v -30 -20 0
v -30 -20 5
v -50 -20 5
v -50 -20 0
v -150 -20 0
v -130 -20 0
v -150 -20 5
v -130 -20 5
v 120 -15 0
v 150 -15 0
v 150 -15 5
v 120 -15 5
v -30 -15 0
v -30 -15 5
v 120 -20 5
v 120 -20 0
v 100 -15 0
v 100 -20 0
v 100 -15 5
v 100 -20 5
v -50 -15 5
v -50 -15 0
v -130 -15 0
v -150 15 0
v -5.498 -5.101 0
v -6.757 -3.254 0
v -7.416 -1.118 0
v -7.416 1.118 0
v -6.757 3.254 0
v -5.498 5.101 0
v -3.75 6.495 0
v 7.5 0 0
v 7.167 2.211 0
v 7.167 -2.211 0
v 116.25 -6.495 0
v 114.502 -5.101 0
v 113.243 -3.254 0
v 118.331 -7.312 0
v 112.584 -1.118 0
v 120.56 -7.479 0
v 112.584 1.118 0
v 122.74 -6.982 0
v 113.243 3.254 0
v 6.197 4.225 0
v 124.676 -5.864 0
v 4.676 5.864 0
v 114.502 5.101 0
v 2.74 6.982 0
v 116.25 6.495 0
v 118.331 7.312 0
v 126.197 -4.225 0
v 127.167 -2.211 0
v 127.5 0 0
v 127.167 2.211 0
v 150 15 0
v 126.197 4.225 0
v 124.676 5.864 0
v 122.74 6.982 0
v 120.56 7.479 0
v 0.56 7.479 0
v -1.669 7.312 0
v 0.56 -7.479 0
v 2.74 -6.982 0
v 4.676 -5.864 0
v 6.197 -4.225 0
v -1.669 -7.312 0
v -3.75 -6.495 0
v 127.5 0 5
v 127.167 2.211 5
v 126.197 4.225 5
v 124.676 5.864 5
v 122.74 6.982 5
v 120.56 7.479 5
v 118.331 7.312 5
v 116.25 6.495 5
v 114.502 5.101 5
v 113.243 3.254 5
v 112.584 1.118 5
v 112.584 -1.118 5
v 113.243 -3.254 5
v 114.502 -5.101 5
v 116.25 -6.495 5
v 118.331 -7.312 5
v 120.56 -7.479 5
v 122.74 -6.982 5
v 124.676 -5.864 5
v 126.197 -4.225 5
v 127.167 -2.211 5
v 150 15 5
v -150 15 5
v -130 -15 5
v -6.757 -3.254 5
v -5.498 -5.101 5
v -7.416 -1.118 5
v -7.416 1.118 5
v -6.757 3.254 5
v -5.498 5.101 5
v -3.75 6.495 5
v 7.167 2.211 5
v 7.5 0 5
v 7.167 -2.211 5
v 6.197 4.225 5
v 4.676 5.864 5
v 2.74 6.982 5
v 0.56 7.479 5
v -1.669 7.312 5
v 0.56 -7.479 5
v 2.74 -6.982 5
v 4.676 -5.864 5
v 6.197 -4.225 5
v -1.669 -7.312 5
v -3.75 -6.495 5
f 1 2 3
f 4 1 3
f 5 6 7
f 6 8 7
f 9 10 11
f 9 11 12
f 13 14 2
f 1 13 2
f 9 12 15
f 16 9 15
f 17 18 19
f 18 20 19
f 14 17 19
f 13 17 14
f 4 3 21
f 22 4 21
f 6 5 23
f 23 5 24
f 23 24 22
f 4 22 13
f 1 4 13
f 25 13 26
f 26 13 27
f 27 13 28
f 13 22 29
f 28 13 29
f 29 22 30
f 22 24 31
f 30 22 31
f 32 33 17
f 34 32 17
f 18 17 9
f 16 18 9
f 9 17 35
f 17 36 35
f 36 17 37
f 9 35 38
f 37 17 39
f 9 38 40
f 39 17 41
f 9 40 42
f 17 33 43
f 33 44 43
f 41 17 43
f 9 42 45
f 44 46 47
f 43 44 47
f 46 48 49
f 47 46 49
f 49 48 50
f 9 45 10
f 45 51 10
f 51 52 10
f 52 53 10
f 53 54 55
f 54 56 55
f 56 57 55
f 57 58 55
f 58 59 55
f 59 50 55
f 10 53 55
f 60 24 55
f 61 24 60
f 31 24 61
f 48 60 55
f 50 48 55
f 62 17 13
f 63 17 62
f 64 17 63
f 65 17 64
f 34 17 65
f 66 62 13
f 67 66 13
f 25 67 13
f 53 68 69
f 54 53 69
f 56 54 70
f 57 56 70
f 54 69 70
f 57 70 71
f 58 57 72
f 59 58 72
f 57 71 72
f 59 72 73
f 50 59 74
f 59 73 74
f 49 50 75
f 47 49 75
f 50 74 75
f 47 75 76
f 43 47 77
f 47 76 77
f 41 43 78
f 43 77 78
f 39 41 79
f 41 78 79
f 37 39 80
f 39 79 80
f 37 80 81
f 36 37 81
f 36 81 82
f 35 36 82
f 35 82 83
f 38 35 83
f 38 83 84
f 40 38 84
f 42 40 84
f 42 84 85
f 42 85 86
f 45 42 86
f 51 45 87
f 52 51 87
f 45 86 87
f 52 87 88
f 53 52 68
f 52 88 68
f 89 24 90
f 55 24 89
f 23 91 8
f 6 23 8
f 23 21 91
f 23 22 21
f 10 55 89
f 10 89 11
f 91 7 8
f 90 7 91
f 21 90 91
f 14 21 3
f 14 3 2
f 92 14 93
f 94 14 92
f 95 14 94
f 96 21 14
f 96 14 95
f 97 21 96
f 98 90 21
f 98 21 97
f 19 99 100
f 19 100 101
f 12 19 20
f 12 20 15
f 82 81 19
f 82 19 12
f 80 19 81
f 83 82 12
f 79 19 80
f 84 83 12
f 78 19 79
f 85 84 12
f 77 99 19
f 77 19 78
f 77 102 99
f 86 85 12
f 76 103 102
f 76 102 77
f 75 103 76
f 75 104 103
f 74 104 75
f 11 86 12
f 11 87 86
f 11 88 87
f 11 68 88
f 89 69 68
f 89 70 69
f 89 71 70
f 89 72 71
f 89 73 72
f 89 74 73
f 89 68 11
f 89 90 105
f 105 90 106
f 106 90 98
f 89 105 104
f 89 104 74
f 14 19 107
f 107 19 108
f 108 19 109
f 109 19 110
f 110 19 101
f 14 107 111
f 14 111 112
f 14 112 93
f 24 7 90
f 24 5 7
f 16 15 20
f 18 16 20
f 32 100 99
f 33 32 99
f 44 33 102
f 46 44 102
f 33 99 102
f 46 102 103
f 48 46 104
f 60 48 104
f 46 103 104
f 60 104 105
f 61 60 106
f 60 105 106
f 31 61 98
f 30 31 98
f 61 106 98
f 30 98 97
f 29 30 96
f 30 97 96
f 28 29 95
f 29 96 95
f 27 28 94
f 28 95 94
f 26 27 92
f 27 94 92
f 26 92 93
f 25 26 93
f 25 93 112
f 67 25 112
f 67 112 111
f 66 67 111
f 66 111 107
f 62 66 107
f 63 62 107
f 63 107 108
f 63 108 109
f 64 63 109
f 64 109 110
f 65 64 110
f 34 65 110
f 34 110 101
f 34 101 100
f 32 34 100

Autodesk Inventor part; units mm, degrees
ref_plane "YZ Plane" through (0, 0, 0) normal (1, 0, 0) x (0, 1, 0)
ref_plane "XZ Plane" through (0, 0, 0) normal (0, 1, 0) x (-1, 0, 0)
ref_plane "XY Plane" through (0, 0, 0) normal (0, 0, 1) x (1, 0, 0)
sketch "Sketch1" plane through (0, 0, 0) normal (0, 0, 1) x (1, 0, 0)
  line L0 (-150, 15) -> (150, 15)
  line L1 (150, 15) -> (150, -15)
  line L2 (150, -15) -> (-150, -15)
  line L3 (-150, -15) -> (-150, 15)
  line L4 (-150, 15) -> (150, -15) construction
  line L5 (150, 15) -> (-150, -15) construction
  point P0 (0, 0)
  dimension "d0" = 300
  dimension "d1" = 30
extrude "Base" add sketch "Sketch1" along normal blind 5
sketch "Sketch2" plane through (0, 0, 5) normal (0, 0, 1) x (1, 0, 0)
  line L0 (-150, -15) -> (150, -15) projected
  line L1 (-150, -15) -> (-130, -15)
  line L2 (-130, -15) -> (-130, -20)
  line L3 (-130, -20) -> (-150, -20)
  line L4 (-150, -20) -> (-150, -15)
  line L5 (-100, -15) -> (-80, -15)
  line L6 (-80, -15) -> (-80, -20)
  line L7 (-80, -20) -> (-100, -20)
  line L8 (-100, -20) -> (-100, -15)
  line L9 (-50, -15) -> (-30, -15)
  line L10 (-30, -15) -> (-30, -20)
  line L11 (-30, -20) -> (-50, -20)
  line L12 (-50, -20) -> (-50, -15)
  line L13 (0, -15) -> (20, -15)
  line L14 (20, -15) -> (20, -20)
  line L15 (20, -20) -> (0, -20)
  line L16 (0, -20) -> (0, -15)
  line L17 (50, -15) -> (70, -15)
  line L18 (70, -15) -> (70, -20)
  line L19 (70, -20) -> (50, -20)
  line L20 (50, -20) -> (50, -15)
  line L21 (100, -15) -> (120, -15)
  line L22 (120, -15) -> (120, -20)
  line L23 (120, -20) -> (100, -20)
  line L24 (100, -20) -> (100, -15)
  point P0 (0, 0)
  point P1 (20, -15)
  point P2 (0, -15)
  point P3 (-30, -15)
  point P4 (-50, -15)
  point P5 (-130, -15)
  point P6 (70, -15)
  point P7 (50, -15)
  point P8 (-80, -15)
  point P9 (-100, -15)
  point P10 (120, -15)
  point P11 (100, -15)
  dimension "d4" = 20
  dimension "d5" = 5
  dimension "d8" = 50
extrude "Encaixe" add sketch "Sketch2" against normal blind 5 contours L0 L22 L23 L24 | L0 L10 L11 L12 | L0 L2 L3 L4
sketch "Sketch3" plane through (0, 0, 5) normal (0, 0, 1) x (1, 0, 0)
  circle A0 centre (120, 0) radius 7.5
  circle A1 centre (0, 0) radius 7.5
  line L0 (150, -15) -> (150, 15) projected
  dimension "d16" = 15
  dimension "d17" = 15
  dimension "d20" = 30
extrude "Extrusion3" cut sketch "Sketch3" against normal blind 10
properties part number "Divisória-30cm c rolamento"
